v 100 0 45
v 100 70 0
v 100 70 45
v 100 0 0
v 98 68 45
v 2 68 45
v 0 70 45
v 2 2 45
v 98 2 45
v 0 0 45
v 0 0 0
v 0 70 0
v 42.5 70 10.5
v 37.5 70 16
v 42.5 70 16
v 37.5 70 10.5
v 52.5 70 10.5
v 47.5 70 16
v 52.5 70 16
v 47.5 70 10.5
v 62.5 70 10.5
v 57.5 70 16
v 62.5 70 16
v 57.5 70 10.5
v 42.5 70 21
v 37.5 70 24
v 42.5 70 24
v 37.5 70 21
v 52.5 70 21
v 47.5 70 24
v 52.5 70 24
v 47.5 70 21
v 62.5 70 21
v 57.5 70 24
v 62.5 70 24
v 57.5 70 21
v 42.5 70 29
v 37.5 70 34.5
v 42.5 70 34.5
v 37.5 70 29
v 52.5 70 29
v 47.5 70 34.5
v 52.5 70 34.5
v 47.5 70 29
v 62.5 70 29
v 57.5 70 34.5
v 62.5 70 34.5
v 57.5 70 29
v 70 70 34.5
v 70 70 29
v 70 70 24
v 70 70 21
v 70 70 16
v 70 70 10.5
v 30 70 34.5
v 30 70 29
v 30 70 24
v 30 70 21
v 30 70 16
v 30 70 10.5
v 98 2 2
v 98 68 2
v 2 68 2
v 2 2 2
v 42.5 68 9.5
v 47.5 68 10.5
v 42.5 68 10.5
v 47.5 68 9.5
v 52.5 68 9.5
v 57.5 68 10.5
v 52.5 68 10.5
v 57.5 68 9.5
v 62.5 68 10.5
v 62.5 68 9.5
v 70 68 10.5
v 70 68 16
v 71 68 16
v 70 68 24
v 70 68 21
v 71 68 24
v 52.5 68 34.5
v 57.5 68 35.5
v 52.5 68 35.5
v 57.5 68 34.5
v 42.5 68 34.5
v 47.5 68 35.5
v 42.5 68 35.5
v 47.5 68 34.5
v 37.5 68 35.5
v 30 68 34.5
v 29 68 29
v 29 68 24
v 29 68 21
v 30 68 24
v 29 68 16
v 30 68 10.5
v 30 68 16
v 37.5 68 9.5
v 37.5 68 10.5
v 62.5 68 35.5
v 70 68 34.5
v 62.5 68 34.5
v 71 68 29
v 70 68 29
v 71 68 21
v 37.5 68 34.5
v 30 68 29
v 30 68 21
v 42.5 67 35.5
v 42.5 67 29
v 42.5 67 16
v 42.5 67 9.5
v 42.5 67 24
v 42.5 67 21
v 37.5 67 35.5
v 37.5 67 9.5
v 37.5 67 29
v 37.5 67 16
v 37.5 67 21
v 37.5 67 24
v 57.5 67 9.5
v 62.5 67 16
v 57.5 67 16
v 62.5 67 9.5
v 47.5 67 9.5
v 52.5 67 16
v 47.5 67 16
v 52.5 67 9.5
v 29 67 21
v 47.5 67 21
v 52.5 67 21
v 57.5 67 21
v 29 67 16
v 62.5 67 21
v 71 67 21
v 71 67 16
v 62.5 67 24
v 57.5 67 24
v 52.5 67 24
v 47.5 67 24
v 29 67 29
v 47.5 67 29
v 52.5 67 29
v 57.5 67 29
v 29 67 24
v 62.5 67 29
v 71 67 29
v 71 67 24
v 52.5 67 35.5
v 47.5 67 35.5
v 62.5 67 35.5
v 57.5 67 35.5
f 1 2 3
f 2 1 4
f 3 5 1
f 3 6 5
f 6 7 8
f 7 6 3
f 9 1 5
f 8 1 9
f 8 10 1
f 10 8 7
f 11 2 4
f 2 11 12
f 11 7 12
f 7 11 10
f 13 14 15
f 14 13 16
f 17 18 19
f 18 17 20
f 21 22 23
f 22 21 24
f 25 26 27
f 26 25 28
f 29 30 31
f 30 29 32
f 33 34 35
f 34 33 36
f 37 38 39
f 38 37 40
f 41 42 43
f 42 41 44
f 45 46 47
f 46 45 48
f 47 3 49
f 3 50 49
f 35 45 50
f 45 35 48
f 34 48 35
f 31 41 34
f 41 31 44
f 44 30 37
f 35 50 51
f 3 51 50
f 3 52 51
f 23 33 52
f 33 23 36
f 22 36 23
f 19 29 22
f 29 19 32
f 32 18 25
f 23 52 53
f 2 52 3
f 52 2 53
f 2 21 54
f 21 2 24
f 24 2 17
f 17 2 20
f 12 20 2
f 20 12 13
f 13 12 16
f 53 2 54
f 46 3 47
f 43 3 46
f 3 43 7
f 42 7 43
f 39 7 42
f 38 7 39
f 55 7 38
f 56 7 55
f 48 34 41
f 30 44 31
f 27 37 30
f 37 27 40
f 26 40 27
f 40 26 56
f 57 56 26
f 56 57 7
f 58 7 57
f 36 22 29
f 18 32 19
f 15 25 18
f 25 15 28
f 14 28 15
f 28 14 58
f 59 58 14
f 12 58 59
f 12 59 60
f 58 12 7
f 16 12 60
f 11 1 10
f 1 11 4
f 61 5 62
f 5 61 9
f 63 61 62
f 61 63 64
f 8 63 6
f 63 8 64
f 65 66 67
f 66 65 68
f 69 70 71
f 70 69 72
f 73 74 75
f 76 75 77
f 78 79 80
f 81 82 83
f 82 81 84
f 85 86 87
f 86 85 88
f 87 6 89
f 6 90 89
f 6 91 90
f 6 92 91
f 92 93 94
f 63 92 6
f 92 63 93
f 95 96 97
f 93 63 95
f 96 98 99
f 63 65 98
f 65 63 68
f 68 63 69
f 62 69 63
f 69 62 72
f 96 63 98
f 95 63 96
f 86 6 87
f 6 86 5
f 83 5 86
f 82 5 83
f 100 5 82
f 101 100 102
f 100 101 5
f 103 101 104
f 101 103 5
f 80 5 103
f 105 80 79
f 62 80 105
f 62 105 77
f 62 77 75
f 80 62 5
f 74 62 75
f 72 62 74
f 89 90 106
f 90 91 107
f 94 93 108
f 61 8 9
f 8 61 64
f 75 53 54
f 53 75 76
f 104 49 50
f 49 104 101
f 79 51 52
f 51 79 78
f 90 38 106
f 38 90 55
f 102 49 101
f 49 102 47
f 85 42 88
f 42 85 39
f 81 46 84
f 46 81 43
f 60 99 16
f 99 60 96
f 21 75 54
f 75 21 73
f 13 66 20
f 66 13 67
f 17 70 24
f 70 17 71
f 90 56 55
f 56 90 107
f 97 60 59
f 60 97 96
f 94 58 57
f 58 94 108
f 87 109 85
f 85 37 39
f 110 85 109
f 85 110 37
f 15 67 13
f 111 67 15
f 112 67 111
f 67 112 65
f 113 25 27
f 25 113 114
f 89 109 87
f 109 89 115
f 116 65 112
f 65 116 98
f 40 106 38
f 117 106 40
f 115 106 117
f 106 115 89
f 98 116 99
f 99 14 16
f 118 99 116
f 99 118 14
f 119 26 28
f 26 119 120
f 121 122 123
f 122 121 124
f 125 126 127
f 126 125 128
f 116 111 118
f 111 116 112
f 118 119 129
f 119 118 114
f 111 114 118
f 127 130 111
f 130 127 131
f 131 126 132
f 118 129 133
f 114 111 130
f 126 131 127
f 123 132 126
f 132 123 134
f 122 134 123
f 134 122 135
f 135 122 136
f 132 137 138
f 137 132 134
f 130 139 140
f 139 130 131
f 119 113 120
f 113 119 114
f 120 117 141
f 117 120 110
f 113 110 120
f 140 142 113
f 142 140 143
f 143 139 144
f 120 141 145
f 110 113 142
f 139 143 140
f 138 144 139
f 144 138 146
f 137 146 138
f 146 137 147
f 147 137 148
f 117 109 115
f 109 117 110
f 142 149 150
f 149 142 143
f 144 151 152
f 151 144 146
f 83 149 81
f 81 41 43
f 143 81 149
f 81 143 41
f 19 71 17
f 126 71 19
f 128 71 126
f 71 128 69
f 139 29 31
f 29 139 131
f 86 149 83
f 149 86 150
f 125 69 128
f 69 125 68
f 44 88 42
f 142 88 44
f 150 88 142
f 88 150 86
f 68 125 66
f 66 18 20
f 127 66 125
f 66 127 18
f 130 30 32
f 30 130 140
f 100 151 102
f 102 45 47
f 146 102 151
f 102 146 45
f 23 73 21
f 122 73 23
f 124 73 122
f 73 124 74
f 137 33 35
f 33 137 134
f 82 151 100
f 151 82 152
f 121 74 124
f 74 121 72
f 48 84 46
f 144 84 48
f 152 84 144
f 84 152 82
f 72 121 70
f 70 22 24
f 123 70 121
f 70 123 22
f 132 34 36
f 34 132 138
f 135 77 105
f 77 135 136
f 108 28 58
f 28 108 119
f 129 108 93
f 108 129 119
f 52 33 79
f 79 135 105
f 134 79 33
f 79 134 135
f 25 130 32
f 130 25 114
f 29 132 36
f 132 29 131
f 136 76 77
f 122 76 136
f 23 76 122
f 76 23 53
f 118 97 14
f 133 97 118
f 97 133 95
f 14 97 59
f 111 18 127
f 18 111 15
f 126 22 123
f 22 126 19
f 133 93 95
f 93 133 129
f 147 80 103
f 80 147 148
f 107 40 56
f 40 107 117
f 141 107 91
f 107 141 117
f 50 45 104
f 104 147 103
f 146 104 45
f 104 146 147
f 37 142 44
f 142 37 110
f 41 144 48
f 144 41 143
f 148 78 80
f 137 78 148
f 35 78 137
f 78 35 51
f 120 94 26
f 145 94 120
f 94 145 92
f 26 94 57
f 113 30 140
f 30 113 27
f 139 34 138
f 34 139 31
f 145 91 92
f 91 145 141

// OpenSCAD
$fn = 32;

// ----------------------------------------------------------------------
// Vent box: crossgrid enclosure
// ----------------------------------------------------------------------

// --- parameters (mm) ---
box_l = 100;              // box length, X
box_w = 70;               // box width, Y
box_h = 45;               // box height, Z
wall_t = 2;               // shell wall thickness
win_l = 40;               // vent window width, X
win_h = 24;               // vent window height, Z
bar_w = 5;                // grid bar width
n_v = 3;                  // vertical bar count
n_h = 2;                  // horizontal bar count

win_z0 = (box_h - win_h) / 2;  // window lower edge Z
v_step = win_l / (n_v + 1);  // vertical bar step
h_step = win_h / (n_h + 1);  // horizontal bar step

difference() {
  union() {
    difference() {
      cube([box_l, box_w, box_h]);
  translate([wall_t, wall_t, wall_t])
    cube([box_l - 2 * wall_t, box_w - 2 * wall_t, box_h]);
  translate([(box_l - win_l) / 2, box_w - wall_t - 1, win_z0])
    cube([win_l, wall_t + 2, win_h]);
    }
    for (i = [1 : n_v])
      translate([(box_l - win_l) / 2 + i * v_step - bar_w / 2,
                 box_w - wall_t - 1, win_z0 - 1])
        cube([bar_w, wall_t + 1, win_h + 2]);
    for (i = [1 : n_h])
      translate([(box_l - win_l) / 2 - 1, box_w - wall_t - 1,
                 win_z0 + i * h_step - bar_w / 2])
        cube([win_l + 2, wall_t + 1, bar_w]);
  }
}
